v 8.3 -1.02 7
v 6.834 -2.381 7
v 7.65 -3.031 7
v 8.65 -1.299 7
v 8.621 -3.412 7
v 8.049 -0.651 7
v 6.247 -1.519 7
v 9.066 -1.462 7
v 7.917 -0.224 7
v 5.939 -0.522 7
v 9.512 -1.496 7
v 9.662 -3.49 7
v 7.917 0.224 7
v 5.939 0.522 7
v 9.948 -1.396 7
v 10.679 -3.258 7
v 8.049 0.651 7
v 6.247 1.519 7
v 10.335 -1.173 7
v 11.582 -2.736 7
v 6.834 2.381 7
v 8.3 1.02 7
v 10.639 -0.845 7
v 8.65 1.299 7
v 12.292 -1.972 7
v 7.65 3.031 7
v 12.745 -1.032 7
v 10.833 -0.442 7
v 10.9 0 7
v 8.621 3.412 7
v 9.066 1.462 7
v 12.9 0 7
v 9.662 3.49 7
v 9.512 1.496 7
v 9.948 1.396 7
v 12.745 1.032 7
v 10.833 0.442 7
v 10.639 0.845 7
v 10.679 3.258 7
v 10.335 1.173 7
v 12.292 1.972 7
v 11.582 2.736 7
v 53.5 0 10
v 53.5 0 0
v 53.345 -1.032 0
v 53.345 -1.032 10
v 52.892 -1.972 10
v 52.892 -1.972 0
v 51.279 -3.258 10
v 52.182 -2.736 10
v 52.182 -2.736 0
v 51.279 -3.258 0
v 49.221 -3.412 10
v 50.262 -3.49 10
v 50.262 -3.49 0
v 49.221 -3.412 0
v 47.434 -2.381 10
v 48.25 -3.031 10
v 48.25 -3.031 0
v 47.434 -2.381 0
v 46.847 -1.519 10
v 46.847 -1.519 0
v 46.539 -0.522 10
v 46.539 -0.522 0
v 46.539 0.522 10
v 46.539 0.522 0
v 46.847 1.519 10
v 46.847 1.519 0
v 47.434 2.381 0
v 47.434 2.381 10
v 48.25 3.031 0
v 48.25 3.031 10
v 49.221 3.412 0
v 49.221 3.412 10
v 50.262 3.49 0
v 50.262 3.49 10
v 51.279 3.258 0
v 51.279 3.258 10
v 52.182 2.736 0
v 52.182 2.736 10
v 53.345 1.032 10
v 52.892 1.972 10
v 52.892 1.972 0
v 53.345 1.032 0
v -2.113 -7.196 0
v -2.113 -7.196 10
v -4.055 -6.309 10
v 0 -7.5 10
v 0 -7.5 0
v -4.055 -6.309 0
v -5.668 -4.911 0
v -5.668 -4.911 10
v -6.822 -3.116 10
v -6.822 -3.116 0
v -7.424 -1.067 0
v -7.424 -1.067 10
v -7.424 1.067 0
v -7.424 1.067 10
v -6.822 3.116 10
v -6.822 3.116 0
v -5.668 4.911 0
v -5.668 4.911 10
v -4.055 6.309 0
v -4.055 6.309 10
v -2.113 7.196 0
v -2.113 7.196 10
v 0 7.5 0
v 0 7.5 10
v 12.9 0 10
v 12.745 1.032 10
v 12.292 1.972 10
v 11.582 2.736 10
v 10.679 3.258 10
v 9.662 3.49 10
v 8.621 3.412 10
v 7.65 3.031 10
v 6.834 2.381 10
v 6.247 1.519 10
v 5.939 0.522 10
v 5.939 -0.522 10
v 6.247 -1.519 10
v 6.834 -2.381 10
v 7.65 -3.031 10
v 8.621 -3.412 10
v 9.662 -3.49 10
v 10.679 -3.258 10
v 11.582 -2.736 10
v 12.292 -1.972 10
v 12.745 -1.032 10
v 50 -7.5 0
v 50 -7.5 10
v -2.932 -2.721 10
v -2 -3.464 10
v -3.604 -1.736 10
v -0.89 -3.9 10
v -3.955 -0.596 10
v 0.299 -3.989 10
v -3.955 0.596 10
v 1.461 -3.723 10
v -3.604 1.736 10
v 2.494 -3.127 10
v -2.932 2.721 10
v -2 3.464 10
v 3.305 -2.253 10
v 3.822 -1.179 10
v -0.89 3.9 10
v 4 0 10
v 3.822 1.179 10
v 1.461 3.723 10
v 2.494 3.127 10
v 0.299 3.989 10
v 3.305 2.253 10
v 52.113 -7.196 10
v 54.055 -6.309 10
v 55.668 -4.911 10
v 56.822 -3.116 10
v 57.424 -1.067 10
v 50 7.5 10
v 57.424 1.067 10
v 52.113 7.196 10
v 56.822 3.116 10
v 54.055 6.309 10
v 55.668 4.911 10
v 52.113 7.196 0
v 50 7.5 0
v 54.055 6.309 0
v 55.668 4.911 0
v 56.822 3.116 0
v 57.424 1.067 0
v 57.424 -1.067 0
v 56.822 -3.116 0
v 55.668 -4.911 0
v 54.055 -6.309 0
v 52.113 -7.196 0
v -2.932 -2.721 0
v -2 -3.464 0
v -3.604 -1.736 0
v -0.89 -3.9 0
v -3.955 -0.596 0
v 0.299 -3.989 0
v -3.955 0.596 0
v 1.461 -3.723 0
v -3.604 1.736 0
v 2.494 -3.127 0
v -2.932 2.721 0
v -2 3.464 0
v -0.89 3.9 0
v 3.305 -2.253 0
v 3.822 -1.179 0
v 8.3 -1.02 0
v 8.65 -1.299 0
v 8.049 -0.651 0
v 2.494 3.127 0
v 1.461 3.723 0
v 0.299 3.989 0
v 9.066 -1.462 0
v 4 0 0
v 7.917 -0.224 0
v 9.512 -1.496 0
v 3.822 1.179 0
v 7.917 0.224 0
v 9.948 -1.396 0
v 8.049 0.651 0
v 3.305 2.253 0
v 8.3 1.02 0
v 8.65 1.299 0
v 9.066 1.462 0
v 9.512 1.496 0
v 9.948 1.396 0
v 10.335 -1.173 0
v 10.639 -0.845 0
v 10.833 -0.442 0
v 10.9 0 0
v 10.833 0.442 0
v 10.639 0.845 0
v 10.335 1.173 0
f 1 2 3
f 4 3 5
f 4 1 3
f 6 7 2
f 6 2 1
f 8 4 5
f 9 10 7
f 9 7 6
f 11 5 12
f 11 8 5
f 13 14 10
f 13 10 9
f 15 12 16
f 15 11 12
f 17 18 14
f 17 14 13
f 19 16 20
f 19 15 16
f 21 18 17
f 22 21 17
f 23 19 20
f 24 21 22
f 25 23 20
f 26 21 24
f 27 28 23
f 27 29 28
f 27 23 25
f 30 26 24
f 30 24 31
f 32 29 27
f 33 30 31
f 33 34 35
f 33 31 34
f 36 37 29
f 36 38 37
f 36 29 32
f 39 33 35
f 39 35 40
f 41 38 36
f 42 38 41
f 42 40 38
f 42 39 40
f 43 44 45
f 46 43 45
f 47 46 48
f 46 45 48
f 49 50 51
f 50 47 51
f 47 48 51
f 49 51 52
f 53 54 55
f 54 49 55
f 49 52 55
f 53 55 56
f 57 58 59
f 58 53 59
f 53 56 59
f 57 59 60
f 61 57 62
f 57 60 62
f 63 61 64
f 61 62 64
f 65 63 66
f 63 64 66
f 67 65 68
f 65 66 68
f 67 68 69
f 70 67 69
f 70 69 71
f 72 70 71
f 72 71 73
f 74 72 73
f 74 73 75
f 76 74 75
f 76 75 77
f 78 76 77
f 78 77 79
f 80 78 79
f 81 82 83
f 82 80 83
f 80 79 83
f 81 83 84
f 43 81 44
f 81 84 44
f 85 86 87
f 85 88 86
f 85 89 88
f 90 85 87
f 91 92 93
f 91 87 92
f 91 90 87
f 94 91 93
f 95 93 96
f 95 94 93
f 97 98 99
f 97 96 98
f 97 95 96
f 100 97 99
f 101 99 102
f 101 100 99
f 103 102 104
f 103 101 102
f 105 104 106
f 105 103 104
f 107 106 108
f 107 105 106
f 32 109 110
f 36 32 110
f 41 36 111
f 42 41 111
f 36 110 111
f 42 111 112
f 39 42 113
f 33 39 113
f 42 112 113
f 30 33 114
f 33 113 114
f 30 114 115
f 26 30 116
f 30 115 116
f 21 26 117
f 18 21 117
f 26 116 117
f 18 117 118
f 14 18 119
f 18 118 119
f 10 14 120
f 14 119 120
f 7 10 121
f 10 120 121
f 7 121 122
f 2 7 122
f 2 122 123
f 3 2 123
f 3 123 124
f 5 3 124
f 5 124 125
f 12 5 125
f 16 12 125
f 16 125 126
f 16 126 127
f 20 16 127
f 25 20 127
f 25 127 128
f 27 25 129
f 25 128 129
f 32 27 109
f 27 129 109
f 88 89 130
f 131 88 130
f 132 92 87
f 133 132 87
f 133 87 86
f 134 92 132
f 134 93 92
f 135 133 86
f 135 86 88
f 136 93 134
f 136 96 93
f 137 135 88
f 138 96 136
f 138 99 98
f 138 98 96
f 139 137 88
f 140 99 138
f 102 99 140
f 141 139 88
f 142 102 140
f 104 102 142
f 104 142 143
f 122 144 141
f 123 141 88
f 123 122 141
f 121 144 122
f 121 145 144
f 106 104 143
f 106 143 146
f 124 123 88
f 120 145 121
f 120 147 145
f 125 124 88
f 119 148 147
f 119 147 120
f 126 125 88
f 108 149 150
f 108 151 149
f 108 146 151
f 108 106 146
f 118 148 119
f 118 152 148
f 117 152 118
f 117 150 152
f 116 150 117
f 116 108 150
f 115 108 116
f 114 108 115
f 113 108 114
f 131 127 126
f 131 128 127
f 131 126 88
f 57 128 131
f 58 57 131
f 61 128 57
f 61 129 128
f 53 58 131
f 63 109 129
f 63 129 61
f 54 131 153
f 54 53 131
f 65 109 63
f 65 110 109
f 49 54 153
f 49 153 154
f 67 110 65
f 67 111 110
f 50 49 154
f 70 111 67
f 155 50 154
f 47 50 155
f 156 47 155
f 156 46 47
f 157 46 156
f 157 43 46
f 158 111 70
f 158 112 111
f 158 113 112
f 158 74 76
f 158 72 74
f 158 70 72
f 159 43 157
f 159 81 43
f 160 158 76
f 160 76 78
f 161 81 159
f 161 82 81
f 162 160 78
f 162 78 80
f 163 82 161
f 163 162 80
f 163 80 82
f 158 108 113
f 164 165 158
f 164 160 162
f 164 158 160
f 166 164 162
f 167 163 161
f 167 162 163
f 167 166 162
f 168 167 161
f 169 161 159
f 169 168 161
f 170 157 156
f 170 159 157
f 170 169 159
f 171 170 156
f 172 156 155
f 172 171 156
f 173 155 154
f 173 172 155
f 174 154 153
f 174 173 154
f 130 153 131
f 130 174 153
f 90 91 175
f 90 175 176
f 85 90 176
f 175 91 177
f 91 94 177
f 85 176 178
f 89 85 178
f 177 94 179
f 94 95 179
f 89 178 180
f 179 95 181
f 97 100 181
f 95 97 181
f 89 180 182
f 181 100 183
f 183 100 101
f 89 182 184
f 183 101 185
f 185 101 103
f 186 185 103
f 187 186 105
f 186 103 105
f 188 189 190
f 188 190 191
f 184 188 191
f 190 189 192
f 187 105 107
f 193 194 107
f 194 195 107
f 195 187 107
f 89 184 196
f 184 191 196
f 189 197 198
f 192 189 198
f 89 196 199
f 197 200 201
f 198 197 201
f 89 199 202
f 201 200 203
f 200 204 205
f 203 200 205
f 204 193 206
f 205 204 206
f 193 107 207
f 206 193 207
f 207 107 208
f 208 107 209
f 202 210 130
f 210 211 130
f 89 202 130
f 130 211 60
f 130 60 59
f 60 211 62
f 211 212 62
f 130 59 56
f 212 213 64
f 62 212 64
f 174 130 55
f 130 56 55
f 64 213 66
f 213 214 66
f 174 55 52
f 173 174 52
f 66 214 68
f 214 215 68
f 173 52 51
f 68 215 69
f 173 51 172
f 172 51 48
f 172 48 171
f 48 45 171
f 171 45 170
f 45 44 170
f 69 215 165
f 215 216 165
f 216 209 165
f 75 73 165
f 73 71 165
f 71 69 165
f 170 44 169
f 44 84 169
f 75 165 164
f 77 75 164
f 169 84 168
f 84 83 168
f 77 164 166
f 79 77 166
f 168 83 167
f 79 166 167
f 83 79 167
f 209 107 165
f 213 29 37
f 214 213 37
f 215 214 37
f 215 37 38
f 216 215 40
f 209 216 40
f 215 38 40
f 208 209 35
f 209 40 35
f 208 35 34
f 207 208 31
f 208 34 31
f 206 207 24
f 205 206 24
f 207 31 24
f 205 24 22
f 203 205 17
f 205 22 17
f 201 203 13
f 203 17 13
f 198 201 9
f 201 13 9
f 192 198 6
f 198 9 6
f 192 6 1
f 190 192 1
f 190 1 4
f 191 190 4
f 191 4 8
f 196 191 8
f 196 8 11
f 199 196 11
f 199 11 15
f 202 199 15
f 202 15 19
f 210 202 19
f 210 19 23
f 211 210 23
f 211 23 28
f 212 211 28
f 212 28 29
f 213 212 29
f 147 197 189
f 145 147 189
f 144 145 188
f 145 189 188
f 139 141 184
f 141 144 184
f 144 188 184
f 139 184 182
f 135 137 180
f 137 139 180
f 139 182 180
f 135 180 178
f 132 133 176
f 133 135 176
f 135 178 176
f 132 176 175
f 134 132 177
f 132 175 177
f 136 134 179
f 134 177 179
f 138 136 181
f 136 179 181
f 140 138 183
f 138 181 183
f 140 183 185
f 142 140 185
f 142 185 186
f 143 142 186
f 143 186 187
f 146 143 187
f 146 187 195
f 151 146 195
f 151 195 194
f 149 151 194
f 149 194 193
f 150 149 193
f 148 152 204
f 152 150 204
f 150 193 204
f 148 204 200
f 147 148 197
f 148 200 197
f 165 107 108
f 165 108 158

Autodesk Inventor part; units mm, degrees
ref_plane "YZ Plane" through (0, 0, 0) normal (1, 0, 0) x (0, 1, 0)
ref_plane "XZ Plane" through (0, 0, 0) normal (0, 1, 0) x (-1, 0, 0)
ref_plane "XY Plane" through (0, 0, 0) normal (0, 0, 1) x (1, 0, 0)
sketch "Sketch1" plane through (0, 0, 0) normal (0, 0, 1) x (1, 0, 0)
  circle A0 centre (0, 0) radius 7.5 construction
  circle A1 centre (0, 0) radius 4
  arc A2 (0, 7.5) -> (0, -7.5) centre (0, 0) ccw
  line L0 (0, 7.5) -> (50, 7.5)
  line L1 (0, -7.5) -> (50, -7.5)
  circle A3 centre (50, 0) radius 7.5 construction
  arc A4 (50, -7.5) -> (50, 7.5) centre (50, 0) ccw
  circle A5 centre (50, 0) radius 3.5
  dimension "d0" = 15
  dimension "d1" = 8
  dimension "d2" = 50
  dimension "d3" = 7
extrude "Extrusion1" add sketch "Sketch1" along normal blind 10
sketch "Sketch2" plane through (0, 0, 10) normal (0, 0, 1) x (1, 0, 0)
  circle A0 centre (9.4, 0) radius 1.5
  point P0 (0, 0)
  dimension "d6" = 3
  dimension "d7" = 9.4
extrude "Extrusion2" cut sketch "Sketch2" against normal through all
sketch "Sketch3" plane through (0, 0, 10) normal (0, 0, 1) x (1, 0, 0)
  circle A0 centre (9.4, 0) radius 1.5 projected
  circle A1 centre (9.4, 0) radius 3.5
  point P0 (0, 0)
  dimension "d10" = 2
extrude "Extrusion3" cut sketch "Sketch3" against normal blind 3
properties part number "GA004" material "ABS Plastic"
